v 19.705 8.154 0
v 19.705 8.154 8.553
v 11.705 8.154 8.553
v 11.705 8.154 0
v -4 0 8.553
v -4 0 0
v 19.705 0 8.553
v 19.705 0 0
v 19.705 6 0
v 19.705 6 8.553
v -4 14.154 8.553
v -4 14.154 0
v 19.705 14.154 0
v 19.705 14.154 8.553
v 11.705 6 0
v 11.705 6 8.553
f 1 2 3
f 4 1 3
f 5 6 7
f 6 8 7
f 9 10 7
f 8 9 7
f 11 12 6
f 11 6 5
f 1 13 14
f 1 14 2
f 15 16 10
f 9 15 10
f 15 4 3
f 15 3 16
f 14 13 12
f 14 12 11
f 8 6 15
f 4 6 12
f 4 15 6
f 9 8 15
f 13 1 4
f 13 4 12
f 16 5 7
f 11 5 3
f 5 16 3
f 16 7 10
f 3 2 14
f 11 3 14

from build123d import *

# Parameters (mm, degrees)
BOSS_EXTRUDE1_DEPTH = 8.552959
SKETCH2_W           = 8.552959
SKETCH2_H           = 14.1536931
BOSS_EXTRUDE2_DEPTH = 4


with BuildPart() as part:
    # Sketch1 → Boss-Extrude1 (new body)
    with BuildSketch(Plane.XY):
        Polygon((0, 0), (0, 14.1536931), (19.704590583, 14.1536931), (19.704590583, 8.1536931), (11.704590583, 8.1536931), (11.704590583, 6), (19.704590583, 6), (19.704590583, 0), align=None)
    extrude(amount=BOSS_EXTRUDE1_DEPTH)

    # Sketch2 → Boss-Extrude2 (add)
    with BuildSketch(Plane.ZY):
        with Locations((4.2764795, 7.07684655)):
            Rectangle(SKETCH2_W, SKETCH2_H)
    extrude(amount=BOSS_EXTRUDE2_DEPTH)


solid = part.part
